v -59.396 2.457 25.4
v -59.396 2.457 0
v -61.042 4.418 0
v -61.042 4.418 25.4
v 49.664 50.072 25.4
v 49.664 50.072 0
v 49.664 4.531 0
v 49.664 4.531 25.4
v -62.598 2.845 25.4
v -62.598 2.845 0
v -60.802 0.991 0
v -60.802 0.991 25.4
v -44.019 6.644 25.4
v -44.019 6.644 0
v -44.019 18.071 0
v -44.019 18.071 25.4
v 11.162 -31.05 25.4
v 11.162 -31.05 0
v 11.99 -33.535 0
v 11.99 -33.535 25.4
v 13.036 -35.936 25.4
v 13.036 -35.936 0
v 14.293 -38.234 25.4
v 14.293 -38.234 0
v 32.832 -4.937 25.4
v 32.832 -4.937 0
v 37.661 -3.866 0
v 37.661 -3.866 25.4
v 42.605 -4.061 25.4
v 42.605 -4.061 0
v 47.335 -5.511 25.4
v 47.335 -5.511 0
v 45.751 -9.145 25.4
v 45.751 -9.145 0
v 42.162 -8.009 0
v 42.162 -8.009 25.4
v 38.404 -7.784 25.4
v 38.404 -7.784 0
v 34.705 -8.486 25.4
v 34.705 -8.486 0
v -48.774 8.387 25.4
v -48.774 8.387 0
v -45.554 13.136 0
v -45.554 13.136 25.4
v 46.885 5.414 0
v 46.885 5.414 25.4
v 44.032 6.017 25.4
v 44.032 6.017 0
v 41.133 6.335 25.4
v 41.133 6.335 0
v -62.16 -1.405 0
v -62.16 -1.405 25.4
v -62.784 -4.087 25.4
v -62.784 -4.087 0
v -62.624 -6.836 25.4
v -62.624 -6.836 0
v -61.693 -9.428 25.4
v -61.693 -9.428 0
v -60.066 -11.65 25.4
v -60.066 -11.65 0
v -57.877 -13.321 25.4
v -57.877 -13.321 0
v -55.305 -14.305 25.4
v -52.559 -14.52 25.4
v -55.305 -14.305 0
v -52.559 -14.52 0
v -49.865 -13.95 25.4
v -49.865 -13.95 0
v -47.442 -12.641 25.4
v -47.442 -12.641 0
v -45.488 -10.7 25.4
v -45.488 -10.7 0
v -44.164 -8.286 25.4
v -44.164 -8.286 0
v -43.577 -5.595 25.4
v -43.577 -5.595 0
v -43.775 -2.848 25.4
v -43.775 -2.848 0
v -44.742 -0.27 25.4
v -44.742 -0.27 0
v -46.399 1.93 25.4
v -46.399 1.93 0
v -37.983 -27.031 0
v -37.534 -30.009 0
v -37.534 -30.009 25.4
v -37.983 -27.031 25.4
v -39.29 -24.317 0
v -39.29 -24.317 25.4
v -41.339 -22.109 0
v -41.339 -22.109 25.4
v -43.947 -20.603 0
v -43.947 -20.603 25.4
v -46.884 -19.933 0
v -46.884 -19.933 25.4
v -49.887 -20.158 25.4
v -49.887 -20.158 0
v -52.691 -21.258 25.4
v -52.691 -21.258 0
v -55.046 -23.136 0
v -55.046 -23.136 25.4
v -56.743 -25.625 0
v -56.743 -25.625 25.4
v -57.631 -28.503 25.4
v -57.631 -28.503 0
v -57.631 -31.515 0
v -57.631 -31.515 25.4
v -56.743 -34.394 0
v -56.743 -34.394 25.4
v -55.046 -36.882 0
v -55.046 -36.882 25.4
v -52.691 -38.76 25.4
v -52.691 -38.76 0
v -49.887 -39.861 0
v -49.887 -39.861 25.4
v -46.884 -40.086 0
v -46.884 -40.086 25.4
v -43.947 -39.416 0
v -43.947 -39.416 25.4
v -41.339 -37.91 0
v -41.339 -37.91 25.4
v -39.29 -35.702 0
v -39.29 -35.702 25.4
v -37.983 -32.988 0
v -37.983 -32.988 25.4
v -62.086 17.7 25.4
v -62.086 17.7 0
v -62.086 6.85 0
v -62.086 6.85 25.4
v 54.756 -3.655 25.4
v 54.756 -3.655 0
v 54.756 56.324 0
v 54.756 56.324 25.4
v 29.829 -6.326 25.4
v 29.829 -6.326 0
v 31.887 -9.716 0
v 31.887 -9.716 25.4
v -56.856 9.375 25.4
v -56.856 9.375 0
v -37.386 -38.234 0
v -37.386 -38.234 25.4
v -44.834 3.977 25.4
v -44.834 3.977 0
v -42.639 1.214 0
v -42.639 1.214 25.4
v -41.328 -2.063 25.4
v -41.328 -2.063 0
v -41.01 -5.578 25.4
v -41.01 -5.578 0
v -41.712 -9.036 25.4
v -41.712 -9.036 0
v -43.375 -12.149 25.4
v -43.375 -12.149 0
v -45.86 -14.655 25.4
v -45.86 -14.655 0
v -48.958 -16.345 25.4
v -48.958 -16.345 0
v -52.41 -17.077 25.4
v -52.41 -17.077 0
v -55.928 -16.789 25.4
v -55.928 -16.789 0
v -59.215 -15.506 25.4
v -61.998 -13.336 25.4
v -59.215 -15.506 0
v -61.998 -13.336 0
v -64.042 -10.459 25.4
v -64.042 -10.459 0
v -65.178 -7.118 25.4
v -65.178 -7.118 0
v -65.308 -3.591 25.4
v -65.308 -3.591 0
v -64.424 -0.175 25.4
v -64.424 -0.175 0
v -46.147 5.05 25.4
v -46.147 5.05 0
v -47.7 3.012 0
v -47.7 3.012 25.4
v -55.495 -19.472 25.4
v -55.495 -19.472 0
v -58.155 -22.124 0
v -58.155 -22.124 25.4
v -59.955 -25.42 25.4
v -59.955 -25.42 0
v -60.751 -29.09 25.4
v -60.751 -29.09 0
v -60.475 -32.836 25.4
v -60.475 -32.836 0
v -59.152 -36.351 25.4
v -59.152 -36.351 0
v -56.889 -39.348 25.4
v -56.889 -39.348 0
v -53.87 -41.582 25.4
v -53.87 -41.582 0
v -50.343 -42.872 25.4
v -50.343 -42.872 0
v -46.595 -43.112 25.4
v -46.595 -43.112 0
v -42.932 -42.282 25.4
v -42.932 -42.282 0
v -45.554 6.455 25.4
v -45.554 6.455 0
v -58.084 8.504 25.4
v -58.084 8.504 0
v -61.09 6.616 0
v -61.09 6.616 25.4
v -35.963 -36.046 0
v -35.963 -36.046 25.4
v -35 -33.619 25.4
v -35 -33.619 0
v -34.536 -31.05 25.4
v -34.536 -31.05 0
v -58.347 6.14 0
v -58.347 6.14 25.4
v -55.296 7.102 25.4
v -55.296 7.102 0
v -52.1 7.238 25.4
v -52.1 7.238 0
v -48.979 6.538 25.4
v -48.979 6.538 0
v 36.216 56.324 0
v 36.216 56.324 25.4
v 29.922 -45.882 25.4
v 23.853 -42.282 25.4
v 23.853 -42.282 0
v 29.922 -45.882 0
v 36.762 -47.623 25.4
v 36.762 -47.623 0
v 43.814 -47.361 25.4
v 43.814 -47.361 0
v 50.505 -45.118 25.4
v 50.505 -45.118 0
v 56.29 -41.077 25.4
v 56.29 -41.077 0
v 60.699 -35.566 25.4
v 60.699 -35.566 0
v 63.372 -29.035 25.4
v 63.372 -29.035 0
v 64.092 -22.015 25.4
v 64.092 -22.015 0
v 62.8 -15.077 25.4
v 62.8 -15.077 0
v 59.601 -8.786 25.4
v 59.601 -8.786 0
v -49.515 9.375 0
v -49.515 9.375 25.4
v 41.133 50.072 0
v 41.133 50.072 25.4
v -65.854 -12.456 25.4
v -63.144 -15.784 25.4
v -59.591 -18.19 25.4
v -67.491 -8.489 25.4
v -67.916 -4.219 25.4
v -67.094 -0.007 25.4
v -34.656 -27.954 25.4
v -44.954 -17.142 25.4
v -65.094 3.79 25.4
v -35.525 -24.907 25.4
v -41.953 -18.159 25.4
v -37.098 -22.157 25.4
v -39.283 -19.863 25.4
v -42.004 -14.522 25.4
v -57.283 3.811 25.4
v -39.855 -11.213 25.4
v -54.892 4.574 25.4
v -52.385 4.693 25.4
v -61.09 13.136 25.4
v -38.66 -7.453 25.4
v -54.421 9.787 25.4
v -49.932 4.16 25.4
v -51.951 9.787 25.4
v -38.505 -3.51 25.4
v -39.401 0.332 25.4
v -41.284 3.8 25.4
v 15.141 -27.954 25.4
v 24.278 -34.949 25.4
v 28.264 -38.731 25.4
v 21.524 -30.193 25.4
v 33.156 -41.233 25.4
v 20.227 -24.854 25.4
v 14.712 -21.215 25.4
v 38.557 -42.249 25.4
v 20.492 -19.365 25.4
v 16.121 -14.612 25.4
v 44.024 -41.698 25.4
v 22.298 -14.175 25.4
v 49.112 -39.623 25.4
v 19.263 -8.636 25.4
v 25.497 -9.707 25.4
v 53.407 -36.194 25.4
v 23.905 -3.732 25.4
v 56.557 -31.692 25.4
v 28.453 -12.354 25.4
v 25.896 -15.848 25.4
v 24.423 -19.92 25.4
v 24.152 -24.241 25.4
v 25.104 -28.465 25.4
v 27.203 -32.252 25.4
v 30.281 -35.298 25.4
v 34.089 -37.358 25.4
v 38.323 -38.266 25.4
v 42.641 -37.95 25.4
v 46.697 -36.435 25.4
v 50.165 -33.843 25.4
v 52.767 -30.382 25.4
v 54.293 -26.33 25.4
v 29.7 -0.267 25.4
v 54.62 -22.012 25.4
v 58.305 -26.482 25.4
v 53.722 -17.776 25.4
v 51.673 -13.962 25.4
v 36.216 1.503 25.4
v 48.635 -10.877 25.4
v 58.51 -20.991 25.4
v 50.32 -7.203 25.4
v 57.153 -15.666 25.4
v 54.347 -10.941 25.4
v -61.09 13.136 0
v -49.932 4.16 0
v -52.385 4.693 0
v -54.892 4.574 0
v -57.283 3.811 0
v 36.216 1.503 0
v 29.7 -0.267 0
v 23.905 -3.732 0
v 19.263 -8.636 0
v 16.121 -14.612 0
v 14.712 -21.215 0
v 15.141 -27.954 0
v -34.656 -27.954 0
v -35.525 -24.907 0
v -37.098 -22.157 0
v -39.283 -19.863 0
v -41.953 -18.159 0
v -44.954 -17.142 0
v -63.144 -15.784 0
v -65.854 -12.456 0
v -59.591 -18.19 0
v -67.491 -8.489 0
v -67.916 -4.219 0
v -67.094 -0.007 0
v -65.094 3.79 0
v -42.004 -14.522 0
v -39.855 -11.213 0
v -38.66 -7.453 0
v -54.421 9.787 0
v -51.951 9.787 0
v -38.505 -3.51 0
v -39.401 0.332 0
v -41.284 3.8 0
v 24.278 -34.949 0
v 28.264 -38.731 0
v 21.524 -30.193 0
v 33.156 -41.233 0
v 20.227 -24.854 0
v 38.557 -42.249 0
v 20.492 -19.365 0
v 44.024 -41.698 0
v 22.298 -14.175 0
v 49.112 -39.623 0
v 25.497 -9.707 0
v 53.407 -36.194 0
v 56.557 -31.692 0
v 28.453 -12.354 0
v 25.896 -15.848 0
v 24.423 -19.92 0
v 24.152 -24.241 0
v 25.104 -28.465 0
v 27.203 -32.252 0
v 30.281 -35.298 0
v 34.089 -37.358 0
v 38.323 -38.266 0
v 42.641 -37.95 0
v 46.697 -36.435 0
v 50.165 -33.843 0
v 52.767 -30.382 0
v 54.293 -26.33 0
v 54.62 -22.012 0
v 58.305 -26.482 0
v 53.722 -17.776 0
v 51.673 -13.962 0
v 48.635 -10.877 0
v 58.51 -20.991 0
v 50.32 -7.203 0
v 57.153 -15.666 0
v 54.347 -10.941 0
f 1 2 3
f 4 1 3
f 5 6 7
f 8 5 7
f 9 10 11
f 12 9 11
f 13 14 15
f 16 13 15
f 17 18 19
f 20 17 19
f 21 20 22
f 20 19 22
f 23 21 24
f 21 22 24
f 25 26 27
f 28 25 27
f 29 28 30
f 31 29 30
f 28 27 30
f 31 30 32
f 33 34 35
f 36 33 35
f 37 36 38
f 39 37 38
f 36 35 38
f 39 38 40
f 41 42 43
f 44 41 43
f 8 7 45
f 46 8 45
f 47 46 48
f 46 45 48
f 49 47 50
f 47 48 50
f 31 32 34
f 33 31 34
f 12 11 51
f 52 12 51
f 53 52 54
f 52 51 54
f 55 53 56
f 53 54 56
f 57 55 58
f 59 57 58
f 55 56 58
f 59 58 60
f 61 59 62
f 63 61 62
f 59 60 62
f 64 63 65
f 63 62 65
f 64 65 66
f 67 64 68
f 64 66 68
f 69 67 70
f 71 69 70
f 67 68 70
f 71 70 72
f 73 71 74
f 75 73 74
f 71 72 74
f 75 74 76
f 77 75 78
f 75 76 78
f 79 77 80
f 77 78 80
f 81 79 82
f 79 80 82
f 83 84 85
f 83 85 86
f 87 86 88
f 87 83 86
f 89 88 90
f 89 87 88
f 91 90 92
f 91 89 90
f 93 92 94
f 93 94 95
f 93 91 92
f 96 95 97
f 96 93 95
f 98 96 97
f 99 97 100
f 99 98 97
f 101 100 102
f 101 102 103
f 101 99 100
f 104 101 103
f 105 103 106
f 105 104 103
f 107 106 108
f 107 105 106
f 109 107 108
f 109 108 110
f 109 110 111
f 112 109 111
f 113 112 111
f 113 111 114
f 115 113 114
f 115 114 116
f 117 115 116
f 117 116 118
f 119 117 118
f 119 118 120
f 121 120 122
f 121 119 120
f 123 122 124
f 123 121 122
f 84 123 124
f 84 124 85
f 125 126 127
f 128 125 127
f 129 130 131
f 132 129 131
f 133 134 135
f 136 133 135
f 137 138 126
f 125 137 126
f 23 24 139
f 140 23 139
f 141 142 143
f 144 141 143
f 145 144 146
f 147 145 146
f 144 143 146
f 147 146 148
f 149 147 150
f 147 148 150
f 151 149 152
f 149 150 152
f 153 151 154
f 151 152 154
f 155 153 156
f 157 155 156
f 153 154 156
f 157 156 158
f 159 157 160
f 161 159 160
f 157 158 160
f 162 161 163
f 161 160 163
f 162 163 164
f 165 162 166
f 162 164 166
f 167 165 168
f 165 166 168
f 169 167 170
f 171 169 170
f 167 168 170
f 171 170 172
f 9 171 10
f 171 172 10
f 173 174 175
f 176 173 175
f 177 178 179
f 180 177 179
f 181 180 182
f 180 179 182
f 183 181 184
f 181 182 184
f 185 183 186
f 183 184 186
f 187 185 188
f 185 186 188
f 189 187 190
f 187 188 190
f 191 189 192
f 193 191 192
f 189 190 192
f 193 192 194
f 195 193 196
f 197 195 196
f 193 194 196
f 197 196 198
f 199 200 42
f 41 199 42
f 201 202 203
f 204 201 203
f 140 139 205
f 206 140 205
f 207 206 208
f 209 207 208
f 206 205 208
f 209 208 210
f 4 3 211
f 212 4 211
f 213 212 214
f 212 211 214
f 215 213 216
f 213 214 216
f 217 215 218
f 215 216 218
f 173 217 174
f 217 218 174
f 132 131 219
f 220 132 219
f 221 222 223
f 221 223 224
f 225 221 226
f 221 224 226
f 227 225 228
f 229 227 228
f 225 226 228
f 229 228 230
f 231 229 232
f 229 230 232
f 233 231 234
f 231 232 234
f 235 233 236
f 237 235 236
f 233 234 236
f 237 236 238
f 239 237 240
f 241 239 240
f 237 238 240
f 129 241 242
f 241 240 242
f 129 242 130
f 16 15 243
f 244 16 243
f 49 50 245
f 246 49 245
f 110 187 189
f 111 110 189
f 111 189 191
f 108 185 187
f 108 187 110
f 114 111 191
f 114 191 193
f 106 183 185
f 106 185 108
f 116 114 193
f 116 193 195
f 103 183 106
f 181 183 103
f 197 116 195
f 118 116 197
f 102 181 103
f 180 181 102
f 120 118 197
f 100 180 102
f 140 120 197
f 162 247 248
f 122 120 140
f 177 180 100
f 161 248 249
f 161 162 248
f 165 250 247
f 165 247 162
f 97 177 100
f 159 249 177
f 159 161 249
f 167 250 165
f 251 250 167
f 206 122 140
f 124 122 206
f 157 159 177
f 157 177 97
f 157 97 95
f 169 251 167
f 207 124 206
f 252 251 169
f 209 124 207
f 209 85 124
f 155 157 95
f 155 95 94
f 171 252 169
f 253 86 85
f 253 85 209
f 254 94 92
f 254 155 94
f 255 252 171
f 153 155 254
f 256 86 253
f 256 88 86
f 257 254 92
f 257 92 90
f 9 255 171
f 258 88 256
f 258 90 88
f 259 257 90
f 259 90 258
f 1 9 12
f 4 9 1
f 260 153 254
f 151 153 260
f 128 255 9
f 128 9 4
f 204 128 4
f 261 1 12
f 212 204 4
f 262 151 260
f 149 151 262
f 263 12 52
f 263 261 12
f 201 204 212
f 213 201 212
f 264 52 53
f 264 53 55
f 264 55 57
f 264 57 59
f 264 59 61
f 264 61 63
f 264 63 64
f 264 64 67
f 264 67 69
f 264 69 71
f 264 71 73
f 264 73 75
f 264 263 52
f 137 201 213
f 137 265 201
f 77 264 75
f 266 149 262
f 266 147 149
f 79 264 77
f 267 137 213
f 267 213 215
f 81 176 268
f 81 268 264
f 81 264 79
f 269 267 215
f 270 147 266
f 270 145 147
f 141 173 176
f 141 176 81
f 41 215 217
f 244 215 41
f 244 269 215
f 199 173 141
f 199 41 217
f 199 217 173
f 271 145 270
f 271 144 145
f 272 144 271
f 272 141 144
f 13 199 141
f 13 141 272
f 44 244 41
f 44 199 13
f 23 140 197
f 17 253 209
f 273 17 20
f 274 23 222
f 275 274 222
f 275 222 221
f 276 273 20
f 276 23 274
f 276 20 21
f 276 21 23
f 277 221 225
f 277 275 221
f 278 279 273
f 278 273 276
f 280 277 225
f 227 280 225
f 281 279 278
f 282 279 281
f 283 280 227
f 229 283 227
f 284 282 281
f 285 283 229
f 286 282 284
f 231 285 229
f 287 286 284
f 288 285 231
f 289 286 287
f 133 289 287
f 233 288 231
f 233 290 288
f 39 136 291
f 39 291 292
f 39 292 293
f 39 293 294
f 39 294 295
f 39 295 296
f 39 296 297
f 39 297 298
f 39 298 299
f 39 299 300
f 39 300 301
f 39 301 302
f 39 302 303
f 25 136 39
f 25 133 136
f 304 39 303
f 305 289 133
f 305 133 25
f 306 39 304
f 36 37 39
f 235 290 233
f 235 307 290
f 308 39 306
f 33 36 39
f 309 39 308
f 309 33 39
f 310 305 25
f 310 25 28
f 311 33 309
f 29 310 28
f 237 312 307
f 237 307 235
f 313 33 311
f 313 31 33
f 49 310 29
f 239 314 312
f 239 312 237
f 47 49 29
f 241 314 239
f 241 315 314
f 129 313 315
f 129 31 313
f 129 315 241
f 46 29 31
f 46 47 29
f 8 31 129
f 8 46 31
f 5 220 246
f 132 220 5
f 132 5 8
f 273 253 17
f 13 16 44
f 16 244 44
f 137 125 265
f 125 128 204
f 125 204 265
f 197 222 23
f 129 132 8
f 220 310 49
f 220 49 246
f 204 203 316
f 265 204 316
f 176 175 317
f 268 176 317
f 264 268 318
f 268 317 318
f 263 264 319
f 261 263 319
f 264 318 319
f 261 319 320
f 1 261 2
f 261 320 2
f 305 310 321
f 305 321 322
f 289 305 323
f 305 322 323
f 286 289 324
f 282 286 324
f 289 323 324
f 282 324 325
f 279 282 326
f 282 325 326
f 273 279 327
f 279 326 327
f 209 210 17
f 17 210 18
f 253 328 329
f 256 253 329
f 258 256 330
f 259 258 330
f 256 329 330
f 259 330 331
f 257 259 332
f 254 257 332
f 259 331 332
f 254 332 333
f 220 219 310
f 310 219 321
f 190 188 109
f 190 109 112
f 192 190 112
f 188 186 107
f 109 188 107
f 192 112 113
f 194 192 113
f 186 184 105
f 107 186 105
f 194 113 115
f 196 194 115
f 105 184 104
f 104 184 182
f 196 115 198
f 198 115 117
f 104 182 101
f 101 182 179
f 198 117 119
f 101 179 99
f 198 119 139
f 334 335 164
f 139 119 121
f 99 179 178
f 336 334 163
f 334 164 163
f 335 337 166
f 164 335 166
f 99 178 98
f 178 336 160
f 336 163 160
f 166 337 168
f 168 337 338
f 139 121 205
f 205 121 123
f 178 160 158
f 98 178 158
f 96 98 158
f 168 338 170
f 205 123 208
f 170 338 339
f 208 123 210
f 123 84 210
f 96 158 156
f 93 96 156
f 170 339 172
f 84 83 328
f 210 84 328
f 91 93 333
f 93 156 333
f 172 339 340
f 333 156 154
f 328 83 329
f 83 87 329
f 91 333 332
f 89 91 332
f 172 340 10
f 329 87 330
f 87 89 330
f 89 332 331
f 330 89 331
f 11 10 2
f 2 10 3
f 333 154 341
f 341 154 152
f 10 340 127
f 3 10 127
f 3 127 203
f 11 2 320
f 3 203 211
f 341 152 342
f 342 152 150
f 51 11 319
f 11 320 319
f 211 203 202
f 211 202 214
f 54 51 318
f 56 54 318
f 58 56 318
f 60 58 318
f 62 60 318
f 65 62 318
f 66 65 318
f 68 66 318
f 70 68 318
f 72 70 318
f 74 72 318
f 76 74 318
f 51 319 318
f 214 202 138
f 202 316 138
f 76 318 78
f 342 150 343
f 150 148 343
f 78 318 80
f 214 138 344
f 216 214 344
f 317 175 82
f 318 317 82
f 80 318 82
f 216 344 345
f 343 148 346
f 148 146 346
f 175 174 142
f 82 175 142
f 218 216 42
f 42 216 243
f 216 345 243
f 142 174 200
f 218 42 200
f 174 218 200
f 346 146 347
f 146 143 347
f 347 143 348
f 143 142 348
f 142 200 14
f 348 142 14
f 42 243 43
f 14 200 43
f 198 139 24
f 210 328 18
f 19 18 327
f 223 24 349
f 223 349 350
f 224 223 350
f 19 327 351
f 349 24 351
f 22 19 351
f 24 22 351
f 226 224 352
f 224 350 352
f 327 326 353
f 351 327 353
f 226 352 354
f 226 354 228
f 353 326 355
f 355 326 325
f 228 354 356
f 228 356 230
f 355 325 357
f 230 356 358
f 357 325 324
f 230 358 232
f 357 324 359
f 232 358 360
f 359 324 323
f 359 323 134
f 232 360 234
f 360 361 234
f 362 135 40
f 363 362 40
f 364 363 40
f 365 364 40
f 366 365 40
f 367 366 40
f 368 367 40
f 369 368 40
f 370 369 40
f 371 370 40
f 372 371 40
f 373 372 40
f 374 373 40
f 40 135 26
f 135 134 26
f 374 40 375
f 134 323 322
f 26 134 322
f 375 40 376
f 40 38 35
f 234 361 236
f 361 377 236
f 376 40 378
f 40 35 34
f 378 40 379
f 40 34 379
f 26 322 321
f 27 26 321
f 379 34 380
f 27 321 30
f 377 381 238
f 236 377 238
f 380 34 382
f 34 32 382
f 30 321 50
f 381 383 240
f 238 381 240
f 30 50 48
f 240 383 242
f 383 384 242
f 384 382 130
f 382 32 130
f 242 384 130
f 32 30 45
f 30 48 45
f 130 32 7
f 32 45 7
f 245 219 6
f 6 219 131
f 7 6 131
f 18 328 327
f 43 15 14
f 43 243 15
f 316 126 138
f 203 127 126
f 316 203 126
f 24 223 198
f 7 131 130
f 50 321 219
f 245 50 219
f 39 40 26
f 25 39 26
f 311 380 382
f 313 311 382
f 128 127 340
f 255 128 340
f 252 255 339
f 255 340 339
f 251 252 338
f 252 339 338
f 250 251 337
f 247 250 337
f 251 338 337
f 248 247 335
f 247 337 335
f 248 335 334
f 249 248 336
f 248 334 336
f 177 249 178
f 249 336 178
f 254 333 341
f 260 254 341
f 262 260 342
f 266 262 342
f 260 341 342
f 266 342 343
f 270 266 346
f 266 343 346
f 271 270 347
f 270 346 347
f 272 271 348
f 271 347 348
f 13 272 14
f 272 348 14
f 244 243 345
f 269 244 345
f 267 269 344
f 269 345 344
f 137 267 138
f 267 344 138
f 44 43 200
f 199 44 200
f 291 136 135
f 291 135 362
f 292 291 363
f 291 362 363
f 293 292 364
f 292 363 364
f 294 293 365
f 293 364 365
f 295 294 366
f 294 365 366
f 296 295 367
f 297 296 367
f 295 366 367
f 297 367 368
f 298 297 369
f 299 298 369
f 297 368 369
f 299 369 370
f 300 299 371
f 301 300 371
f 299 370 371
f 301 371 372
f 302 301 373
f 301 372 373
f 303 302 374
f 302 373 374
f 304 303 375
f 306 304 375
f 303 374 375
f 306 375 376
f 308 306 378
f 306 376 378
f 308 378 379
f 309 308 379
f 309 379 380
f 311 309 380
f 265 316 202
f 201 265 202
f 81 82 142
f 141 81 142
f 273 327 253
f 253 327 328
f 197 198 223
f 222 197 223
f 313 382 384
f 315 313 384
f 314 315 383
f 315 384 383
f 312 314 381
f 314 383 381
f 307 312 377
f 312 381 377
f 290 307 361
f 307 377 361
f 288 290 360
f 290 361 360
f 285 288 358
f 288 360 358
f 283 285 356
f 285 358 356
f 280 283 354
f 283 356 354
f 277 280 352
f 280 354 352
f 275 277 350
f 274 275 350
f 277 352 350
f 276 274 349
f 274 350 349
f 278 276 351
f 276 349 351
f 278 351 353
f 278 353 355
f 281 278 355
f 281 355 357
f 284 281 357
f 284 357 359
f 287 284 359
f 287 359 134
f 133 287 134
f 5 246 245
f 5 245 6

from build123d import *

# Parameters (mm, degrees)
F0_R     = 10.104738
F1_DEPTH = 25.4


with BuildPart() as f1:
    # F0 (on Top) → F1 (new body)
    with BuildSketch(Plane.XY):
        with BuildLine():
            ThreePointArc((36.215748, 1.502736), (19.263337, -8.635989), (15.140539, -27.953869))
            Line((15.140539, -27.953869), (0, -27.953869))
            Line((0, -27.953869), (0, -31.049898))
            Line((0, -31.049898), (11.078159, -31.049898))
            Line((11.078159, -31.049898), (11.161915, -31.049898))
            ThreePointArc((11.161915, -31.049898), (12.486345, -34.747137), (14.292773, -38.234328))
            Line((14.292773, -38.234328), (14.198601, -38.234328))
            Line((14.198601, -38.234328), (0, -38.234328))
            Line((0, -38.234328), (0, -42.281694))
            Line((0, -42.281694), (23.853084, -42.281694))
            ThreePointArc((23.853084, -42.281694), (58.692125, -38.479339), (54.755788, -3.655182))
            Line((54.755788, -3.655182), (54.755788, 56.323968))
            Line((54.755788, 56.323968), (36.215748, 56.323968))
            Line((36.215748, 56.323968), (36.215748, 1.502736))
        make_face()
        with BuildLine():
            ThreePointArc((50.319548, -7.202714), (38.556725, -42.249256), (29.828903, -6.326432))
            Line((29.828903, -6.326432), (31.886789, -9.716487))
            ThreePointArc((31.886789, -9.716487), (38.322899, -38.266224), (48.634886, -10.876921))
            Line((48.634886, -10.876921), (50.319548, -7.202714))
        make_face(mode=Mode.SUBTRACT)
        with BuildLine():
            Line((34.705213, -8.485508), (32.831621, -4.937194))
            ThreePointArc((32.831621, -4.937194), (40.139306, -3.803961), (47.334618, -5.510994))
            Line((47.334618, -5.510994), (45.750625, -9.145473))
            ThreePointArc((45.750625, -9.145473), (40.289779, -7.780181), (34.705213, -8.485508))
        make_face(mode=Mode.SUBTRACT)
        with BuildLine():
            Line((49.663853, 50.072402), (49.663853, 4.530995))
            ThreePointArc((49.663853, 4.530995), (45.465515, 5.751043), (41.132715, 6.335345))
            Line((41.132715, 6.335345), (41.132715, 50.072402))
            Line((41.132715, 50.072402), (49.663853, 50.072402))
        make_face(mode=Mode.SUBTRACT)
        with BuildLine():
            Line((0, -31.049898), (0, -27.953869))
            Line((0, -27.953869), (-34.656468, -27.953869))
            ThreePointArc((-34.656468, -27.953869), (-38.121079, -20.944111), (-44.953929, -17.142479))
            ThreePointArc((-44.953929, -17.142479), (-38.450523, -5.486514), (-44.018981, 6.643946))
            Line((-44.018981, 6.643946), (-44.018981, 18.070712))
            Line((-44.018981, 18.070712), (-49.515065, 9.375074))
            ThreePointArc((-49.515065, 9.375074), (-53.185694, 9.839214), (-56.856323, 9.375074))
            Line((-56.856323, 9.375074), (-62.085995, 17.700483))
            Line((-62.085995, 17.700483), (-62.085995, 6.850444))
            ThreePointArc((-62.085995, 6.850444), (-67.490664, -8.489032), (-55.495376, -19.471883))
            ThreePointArc((-55.495376, -19.471883), (-59.151883, -36.350704), (-42.931896, -42.281694))
            Line((-42.931896, -42.281694), (0, -42.281694))
            Line((0, -42.281694), (0, -38.234328))
            Line((0, -38.234328), (-37.386212, -38.234328))
            ThreePointArc((-37.386212, -38.234328), (-35.421086, -34.856351), (-34.536004, -31.049898))
            Line((-34.536004, -31.049898), (0, -31.049898))
        make_face()
        with Locations((-47.638755, -30.009355)):
            Circle(F0_R, mode=Mode.SUBTRACT)
        with BuildLine():
            ThreePointArc((-44.833815, 3.977288), (-52.410291, -17.076523), (-62.597681, 2.8454))
            Line((-62.597681, 2.8454), (-60.802351, 0.991043))
            ThreePointArc((-60.802351, 0.991043), (-52.559167, -14.52044), (-46.399061, 1.929766))
            Line((-46.399061, 1.929766), (-44.833815, 3.977288))
        make_face(mode=Mode.SUBTRACT)
        with BuildLine():
            Line((-59.396034, 2.457176), (-61.042475, 4.417974))
            ThreePointArc((-61.042475, 4.417974), (-53.702716, 7.275567), (-46.147241, 5.050103))
            Line((-46.147241, 5.050103), (-47.700324, 3.011949))
            ThreePointArc((-47.700324, 3.011949), (-53.642135, 4.715346), (-59.396034, 2.457176))
        make_face(mode=Mode.SUBTRACT)
        Polygon((-61.090183, 6.61603), (-61.090183, 13.13639), (-58.084256, 8.504227), align=None, mode=Mode.SUBTRACT)
        Polygon((-48.773948, 8.386992), (-45.554016, 13.13639), (-45.554016, 6.455034), align=None, mode=Mode.SUBTRACT)
    extrude(amount=F1_DEPTH)


solid = f1.part
